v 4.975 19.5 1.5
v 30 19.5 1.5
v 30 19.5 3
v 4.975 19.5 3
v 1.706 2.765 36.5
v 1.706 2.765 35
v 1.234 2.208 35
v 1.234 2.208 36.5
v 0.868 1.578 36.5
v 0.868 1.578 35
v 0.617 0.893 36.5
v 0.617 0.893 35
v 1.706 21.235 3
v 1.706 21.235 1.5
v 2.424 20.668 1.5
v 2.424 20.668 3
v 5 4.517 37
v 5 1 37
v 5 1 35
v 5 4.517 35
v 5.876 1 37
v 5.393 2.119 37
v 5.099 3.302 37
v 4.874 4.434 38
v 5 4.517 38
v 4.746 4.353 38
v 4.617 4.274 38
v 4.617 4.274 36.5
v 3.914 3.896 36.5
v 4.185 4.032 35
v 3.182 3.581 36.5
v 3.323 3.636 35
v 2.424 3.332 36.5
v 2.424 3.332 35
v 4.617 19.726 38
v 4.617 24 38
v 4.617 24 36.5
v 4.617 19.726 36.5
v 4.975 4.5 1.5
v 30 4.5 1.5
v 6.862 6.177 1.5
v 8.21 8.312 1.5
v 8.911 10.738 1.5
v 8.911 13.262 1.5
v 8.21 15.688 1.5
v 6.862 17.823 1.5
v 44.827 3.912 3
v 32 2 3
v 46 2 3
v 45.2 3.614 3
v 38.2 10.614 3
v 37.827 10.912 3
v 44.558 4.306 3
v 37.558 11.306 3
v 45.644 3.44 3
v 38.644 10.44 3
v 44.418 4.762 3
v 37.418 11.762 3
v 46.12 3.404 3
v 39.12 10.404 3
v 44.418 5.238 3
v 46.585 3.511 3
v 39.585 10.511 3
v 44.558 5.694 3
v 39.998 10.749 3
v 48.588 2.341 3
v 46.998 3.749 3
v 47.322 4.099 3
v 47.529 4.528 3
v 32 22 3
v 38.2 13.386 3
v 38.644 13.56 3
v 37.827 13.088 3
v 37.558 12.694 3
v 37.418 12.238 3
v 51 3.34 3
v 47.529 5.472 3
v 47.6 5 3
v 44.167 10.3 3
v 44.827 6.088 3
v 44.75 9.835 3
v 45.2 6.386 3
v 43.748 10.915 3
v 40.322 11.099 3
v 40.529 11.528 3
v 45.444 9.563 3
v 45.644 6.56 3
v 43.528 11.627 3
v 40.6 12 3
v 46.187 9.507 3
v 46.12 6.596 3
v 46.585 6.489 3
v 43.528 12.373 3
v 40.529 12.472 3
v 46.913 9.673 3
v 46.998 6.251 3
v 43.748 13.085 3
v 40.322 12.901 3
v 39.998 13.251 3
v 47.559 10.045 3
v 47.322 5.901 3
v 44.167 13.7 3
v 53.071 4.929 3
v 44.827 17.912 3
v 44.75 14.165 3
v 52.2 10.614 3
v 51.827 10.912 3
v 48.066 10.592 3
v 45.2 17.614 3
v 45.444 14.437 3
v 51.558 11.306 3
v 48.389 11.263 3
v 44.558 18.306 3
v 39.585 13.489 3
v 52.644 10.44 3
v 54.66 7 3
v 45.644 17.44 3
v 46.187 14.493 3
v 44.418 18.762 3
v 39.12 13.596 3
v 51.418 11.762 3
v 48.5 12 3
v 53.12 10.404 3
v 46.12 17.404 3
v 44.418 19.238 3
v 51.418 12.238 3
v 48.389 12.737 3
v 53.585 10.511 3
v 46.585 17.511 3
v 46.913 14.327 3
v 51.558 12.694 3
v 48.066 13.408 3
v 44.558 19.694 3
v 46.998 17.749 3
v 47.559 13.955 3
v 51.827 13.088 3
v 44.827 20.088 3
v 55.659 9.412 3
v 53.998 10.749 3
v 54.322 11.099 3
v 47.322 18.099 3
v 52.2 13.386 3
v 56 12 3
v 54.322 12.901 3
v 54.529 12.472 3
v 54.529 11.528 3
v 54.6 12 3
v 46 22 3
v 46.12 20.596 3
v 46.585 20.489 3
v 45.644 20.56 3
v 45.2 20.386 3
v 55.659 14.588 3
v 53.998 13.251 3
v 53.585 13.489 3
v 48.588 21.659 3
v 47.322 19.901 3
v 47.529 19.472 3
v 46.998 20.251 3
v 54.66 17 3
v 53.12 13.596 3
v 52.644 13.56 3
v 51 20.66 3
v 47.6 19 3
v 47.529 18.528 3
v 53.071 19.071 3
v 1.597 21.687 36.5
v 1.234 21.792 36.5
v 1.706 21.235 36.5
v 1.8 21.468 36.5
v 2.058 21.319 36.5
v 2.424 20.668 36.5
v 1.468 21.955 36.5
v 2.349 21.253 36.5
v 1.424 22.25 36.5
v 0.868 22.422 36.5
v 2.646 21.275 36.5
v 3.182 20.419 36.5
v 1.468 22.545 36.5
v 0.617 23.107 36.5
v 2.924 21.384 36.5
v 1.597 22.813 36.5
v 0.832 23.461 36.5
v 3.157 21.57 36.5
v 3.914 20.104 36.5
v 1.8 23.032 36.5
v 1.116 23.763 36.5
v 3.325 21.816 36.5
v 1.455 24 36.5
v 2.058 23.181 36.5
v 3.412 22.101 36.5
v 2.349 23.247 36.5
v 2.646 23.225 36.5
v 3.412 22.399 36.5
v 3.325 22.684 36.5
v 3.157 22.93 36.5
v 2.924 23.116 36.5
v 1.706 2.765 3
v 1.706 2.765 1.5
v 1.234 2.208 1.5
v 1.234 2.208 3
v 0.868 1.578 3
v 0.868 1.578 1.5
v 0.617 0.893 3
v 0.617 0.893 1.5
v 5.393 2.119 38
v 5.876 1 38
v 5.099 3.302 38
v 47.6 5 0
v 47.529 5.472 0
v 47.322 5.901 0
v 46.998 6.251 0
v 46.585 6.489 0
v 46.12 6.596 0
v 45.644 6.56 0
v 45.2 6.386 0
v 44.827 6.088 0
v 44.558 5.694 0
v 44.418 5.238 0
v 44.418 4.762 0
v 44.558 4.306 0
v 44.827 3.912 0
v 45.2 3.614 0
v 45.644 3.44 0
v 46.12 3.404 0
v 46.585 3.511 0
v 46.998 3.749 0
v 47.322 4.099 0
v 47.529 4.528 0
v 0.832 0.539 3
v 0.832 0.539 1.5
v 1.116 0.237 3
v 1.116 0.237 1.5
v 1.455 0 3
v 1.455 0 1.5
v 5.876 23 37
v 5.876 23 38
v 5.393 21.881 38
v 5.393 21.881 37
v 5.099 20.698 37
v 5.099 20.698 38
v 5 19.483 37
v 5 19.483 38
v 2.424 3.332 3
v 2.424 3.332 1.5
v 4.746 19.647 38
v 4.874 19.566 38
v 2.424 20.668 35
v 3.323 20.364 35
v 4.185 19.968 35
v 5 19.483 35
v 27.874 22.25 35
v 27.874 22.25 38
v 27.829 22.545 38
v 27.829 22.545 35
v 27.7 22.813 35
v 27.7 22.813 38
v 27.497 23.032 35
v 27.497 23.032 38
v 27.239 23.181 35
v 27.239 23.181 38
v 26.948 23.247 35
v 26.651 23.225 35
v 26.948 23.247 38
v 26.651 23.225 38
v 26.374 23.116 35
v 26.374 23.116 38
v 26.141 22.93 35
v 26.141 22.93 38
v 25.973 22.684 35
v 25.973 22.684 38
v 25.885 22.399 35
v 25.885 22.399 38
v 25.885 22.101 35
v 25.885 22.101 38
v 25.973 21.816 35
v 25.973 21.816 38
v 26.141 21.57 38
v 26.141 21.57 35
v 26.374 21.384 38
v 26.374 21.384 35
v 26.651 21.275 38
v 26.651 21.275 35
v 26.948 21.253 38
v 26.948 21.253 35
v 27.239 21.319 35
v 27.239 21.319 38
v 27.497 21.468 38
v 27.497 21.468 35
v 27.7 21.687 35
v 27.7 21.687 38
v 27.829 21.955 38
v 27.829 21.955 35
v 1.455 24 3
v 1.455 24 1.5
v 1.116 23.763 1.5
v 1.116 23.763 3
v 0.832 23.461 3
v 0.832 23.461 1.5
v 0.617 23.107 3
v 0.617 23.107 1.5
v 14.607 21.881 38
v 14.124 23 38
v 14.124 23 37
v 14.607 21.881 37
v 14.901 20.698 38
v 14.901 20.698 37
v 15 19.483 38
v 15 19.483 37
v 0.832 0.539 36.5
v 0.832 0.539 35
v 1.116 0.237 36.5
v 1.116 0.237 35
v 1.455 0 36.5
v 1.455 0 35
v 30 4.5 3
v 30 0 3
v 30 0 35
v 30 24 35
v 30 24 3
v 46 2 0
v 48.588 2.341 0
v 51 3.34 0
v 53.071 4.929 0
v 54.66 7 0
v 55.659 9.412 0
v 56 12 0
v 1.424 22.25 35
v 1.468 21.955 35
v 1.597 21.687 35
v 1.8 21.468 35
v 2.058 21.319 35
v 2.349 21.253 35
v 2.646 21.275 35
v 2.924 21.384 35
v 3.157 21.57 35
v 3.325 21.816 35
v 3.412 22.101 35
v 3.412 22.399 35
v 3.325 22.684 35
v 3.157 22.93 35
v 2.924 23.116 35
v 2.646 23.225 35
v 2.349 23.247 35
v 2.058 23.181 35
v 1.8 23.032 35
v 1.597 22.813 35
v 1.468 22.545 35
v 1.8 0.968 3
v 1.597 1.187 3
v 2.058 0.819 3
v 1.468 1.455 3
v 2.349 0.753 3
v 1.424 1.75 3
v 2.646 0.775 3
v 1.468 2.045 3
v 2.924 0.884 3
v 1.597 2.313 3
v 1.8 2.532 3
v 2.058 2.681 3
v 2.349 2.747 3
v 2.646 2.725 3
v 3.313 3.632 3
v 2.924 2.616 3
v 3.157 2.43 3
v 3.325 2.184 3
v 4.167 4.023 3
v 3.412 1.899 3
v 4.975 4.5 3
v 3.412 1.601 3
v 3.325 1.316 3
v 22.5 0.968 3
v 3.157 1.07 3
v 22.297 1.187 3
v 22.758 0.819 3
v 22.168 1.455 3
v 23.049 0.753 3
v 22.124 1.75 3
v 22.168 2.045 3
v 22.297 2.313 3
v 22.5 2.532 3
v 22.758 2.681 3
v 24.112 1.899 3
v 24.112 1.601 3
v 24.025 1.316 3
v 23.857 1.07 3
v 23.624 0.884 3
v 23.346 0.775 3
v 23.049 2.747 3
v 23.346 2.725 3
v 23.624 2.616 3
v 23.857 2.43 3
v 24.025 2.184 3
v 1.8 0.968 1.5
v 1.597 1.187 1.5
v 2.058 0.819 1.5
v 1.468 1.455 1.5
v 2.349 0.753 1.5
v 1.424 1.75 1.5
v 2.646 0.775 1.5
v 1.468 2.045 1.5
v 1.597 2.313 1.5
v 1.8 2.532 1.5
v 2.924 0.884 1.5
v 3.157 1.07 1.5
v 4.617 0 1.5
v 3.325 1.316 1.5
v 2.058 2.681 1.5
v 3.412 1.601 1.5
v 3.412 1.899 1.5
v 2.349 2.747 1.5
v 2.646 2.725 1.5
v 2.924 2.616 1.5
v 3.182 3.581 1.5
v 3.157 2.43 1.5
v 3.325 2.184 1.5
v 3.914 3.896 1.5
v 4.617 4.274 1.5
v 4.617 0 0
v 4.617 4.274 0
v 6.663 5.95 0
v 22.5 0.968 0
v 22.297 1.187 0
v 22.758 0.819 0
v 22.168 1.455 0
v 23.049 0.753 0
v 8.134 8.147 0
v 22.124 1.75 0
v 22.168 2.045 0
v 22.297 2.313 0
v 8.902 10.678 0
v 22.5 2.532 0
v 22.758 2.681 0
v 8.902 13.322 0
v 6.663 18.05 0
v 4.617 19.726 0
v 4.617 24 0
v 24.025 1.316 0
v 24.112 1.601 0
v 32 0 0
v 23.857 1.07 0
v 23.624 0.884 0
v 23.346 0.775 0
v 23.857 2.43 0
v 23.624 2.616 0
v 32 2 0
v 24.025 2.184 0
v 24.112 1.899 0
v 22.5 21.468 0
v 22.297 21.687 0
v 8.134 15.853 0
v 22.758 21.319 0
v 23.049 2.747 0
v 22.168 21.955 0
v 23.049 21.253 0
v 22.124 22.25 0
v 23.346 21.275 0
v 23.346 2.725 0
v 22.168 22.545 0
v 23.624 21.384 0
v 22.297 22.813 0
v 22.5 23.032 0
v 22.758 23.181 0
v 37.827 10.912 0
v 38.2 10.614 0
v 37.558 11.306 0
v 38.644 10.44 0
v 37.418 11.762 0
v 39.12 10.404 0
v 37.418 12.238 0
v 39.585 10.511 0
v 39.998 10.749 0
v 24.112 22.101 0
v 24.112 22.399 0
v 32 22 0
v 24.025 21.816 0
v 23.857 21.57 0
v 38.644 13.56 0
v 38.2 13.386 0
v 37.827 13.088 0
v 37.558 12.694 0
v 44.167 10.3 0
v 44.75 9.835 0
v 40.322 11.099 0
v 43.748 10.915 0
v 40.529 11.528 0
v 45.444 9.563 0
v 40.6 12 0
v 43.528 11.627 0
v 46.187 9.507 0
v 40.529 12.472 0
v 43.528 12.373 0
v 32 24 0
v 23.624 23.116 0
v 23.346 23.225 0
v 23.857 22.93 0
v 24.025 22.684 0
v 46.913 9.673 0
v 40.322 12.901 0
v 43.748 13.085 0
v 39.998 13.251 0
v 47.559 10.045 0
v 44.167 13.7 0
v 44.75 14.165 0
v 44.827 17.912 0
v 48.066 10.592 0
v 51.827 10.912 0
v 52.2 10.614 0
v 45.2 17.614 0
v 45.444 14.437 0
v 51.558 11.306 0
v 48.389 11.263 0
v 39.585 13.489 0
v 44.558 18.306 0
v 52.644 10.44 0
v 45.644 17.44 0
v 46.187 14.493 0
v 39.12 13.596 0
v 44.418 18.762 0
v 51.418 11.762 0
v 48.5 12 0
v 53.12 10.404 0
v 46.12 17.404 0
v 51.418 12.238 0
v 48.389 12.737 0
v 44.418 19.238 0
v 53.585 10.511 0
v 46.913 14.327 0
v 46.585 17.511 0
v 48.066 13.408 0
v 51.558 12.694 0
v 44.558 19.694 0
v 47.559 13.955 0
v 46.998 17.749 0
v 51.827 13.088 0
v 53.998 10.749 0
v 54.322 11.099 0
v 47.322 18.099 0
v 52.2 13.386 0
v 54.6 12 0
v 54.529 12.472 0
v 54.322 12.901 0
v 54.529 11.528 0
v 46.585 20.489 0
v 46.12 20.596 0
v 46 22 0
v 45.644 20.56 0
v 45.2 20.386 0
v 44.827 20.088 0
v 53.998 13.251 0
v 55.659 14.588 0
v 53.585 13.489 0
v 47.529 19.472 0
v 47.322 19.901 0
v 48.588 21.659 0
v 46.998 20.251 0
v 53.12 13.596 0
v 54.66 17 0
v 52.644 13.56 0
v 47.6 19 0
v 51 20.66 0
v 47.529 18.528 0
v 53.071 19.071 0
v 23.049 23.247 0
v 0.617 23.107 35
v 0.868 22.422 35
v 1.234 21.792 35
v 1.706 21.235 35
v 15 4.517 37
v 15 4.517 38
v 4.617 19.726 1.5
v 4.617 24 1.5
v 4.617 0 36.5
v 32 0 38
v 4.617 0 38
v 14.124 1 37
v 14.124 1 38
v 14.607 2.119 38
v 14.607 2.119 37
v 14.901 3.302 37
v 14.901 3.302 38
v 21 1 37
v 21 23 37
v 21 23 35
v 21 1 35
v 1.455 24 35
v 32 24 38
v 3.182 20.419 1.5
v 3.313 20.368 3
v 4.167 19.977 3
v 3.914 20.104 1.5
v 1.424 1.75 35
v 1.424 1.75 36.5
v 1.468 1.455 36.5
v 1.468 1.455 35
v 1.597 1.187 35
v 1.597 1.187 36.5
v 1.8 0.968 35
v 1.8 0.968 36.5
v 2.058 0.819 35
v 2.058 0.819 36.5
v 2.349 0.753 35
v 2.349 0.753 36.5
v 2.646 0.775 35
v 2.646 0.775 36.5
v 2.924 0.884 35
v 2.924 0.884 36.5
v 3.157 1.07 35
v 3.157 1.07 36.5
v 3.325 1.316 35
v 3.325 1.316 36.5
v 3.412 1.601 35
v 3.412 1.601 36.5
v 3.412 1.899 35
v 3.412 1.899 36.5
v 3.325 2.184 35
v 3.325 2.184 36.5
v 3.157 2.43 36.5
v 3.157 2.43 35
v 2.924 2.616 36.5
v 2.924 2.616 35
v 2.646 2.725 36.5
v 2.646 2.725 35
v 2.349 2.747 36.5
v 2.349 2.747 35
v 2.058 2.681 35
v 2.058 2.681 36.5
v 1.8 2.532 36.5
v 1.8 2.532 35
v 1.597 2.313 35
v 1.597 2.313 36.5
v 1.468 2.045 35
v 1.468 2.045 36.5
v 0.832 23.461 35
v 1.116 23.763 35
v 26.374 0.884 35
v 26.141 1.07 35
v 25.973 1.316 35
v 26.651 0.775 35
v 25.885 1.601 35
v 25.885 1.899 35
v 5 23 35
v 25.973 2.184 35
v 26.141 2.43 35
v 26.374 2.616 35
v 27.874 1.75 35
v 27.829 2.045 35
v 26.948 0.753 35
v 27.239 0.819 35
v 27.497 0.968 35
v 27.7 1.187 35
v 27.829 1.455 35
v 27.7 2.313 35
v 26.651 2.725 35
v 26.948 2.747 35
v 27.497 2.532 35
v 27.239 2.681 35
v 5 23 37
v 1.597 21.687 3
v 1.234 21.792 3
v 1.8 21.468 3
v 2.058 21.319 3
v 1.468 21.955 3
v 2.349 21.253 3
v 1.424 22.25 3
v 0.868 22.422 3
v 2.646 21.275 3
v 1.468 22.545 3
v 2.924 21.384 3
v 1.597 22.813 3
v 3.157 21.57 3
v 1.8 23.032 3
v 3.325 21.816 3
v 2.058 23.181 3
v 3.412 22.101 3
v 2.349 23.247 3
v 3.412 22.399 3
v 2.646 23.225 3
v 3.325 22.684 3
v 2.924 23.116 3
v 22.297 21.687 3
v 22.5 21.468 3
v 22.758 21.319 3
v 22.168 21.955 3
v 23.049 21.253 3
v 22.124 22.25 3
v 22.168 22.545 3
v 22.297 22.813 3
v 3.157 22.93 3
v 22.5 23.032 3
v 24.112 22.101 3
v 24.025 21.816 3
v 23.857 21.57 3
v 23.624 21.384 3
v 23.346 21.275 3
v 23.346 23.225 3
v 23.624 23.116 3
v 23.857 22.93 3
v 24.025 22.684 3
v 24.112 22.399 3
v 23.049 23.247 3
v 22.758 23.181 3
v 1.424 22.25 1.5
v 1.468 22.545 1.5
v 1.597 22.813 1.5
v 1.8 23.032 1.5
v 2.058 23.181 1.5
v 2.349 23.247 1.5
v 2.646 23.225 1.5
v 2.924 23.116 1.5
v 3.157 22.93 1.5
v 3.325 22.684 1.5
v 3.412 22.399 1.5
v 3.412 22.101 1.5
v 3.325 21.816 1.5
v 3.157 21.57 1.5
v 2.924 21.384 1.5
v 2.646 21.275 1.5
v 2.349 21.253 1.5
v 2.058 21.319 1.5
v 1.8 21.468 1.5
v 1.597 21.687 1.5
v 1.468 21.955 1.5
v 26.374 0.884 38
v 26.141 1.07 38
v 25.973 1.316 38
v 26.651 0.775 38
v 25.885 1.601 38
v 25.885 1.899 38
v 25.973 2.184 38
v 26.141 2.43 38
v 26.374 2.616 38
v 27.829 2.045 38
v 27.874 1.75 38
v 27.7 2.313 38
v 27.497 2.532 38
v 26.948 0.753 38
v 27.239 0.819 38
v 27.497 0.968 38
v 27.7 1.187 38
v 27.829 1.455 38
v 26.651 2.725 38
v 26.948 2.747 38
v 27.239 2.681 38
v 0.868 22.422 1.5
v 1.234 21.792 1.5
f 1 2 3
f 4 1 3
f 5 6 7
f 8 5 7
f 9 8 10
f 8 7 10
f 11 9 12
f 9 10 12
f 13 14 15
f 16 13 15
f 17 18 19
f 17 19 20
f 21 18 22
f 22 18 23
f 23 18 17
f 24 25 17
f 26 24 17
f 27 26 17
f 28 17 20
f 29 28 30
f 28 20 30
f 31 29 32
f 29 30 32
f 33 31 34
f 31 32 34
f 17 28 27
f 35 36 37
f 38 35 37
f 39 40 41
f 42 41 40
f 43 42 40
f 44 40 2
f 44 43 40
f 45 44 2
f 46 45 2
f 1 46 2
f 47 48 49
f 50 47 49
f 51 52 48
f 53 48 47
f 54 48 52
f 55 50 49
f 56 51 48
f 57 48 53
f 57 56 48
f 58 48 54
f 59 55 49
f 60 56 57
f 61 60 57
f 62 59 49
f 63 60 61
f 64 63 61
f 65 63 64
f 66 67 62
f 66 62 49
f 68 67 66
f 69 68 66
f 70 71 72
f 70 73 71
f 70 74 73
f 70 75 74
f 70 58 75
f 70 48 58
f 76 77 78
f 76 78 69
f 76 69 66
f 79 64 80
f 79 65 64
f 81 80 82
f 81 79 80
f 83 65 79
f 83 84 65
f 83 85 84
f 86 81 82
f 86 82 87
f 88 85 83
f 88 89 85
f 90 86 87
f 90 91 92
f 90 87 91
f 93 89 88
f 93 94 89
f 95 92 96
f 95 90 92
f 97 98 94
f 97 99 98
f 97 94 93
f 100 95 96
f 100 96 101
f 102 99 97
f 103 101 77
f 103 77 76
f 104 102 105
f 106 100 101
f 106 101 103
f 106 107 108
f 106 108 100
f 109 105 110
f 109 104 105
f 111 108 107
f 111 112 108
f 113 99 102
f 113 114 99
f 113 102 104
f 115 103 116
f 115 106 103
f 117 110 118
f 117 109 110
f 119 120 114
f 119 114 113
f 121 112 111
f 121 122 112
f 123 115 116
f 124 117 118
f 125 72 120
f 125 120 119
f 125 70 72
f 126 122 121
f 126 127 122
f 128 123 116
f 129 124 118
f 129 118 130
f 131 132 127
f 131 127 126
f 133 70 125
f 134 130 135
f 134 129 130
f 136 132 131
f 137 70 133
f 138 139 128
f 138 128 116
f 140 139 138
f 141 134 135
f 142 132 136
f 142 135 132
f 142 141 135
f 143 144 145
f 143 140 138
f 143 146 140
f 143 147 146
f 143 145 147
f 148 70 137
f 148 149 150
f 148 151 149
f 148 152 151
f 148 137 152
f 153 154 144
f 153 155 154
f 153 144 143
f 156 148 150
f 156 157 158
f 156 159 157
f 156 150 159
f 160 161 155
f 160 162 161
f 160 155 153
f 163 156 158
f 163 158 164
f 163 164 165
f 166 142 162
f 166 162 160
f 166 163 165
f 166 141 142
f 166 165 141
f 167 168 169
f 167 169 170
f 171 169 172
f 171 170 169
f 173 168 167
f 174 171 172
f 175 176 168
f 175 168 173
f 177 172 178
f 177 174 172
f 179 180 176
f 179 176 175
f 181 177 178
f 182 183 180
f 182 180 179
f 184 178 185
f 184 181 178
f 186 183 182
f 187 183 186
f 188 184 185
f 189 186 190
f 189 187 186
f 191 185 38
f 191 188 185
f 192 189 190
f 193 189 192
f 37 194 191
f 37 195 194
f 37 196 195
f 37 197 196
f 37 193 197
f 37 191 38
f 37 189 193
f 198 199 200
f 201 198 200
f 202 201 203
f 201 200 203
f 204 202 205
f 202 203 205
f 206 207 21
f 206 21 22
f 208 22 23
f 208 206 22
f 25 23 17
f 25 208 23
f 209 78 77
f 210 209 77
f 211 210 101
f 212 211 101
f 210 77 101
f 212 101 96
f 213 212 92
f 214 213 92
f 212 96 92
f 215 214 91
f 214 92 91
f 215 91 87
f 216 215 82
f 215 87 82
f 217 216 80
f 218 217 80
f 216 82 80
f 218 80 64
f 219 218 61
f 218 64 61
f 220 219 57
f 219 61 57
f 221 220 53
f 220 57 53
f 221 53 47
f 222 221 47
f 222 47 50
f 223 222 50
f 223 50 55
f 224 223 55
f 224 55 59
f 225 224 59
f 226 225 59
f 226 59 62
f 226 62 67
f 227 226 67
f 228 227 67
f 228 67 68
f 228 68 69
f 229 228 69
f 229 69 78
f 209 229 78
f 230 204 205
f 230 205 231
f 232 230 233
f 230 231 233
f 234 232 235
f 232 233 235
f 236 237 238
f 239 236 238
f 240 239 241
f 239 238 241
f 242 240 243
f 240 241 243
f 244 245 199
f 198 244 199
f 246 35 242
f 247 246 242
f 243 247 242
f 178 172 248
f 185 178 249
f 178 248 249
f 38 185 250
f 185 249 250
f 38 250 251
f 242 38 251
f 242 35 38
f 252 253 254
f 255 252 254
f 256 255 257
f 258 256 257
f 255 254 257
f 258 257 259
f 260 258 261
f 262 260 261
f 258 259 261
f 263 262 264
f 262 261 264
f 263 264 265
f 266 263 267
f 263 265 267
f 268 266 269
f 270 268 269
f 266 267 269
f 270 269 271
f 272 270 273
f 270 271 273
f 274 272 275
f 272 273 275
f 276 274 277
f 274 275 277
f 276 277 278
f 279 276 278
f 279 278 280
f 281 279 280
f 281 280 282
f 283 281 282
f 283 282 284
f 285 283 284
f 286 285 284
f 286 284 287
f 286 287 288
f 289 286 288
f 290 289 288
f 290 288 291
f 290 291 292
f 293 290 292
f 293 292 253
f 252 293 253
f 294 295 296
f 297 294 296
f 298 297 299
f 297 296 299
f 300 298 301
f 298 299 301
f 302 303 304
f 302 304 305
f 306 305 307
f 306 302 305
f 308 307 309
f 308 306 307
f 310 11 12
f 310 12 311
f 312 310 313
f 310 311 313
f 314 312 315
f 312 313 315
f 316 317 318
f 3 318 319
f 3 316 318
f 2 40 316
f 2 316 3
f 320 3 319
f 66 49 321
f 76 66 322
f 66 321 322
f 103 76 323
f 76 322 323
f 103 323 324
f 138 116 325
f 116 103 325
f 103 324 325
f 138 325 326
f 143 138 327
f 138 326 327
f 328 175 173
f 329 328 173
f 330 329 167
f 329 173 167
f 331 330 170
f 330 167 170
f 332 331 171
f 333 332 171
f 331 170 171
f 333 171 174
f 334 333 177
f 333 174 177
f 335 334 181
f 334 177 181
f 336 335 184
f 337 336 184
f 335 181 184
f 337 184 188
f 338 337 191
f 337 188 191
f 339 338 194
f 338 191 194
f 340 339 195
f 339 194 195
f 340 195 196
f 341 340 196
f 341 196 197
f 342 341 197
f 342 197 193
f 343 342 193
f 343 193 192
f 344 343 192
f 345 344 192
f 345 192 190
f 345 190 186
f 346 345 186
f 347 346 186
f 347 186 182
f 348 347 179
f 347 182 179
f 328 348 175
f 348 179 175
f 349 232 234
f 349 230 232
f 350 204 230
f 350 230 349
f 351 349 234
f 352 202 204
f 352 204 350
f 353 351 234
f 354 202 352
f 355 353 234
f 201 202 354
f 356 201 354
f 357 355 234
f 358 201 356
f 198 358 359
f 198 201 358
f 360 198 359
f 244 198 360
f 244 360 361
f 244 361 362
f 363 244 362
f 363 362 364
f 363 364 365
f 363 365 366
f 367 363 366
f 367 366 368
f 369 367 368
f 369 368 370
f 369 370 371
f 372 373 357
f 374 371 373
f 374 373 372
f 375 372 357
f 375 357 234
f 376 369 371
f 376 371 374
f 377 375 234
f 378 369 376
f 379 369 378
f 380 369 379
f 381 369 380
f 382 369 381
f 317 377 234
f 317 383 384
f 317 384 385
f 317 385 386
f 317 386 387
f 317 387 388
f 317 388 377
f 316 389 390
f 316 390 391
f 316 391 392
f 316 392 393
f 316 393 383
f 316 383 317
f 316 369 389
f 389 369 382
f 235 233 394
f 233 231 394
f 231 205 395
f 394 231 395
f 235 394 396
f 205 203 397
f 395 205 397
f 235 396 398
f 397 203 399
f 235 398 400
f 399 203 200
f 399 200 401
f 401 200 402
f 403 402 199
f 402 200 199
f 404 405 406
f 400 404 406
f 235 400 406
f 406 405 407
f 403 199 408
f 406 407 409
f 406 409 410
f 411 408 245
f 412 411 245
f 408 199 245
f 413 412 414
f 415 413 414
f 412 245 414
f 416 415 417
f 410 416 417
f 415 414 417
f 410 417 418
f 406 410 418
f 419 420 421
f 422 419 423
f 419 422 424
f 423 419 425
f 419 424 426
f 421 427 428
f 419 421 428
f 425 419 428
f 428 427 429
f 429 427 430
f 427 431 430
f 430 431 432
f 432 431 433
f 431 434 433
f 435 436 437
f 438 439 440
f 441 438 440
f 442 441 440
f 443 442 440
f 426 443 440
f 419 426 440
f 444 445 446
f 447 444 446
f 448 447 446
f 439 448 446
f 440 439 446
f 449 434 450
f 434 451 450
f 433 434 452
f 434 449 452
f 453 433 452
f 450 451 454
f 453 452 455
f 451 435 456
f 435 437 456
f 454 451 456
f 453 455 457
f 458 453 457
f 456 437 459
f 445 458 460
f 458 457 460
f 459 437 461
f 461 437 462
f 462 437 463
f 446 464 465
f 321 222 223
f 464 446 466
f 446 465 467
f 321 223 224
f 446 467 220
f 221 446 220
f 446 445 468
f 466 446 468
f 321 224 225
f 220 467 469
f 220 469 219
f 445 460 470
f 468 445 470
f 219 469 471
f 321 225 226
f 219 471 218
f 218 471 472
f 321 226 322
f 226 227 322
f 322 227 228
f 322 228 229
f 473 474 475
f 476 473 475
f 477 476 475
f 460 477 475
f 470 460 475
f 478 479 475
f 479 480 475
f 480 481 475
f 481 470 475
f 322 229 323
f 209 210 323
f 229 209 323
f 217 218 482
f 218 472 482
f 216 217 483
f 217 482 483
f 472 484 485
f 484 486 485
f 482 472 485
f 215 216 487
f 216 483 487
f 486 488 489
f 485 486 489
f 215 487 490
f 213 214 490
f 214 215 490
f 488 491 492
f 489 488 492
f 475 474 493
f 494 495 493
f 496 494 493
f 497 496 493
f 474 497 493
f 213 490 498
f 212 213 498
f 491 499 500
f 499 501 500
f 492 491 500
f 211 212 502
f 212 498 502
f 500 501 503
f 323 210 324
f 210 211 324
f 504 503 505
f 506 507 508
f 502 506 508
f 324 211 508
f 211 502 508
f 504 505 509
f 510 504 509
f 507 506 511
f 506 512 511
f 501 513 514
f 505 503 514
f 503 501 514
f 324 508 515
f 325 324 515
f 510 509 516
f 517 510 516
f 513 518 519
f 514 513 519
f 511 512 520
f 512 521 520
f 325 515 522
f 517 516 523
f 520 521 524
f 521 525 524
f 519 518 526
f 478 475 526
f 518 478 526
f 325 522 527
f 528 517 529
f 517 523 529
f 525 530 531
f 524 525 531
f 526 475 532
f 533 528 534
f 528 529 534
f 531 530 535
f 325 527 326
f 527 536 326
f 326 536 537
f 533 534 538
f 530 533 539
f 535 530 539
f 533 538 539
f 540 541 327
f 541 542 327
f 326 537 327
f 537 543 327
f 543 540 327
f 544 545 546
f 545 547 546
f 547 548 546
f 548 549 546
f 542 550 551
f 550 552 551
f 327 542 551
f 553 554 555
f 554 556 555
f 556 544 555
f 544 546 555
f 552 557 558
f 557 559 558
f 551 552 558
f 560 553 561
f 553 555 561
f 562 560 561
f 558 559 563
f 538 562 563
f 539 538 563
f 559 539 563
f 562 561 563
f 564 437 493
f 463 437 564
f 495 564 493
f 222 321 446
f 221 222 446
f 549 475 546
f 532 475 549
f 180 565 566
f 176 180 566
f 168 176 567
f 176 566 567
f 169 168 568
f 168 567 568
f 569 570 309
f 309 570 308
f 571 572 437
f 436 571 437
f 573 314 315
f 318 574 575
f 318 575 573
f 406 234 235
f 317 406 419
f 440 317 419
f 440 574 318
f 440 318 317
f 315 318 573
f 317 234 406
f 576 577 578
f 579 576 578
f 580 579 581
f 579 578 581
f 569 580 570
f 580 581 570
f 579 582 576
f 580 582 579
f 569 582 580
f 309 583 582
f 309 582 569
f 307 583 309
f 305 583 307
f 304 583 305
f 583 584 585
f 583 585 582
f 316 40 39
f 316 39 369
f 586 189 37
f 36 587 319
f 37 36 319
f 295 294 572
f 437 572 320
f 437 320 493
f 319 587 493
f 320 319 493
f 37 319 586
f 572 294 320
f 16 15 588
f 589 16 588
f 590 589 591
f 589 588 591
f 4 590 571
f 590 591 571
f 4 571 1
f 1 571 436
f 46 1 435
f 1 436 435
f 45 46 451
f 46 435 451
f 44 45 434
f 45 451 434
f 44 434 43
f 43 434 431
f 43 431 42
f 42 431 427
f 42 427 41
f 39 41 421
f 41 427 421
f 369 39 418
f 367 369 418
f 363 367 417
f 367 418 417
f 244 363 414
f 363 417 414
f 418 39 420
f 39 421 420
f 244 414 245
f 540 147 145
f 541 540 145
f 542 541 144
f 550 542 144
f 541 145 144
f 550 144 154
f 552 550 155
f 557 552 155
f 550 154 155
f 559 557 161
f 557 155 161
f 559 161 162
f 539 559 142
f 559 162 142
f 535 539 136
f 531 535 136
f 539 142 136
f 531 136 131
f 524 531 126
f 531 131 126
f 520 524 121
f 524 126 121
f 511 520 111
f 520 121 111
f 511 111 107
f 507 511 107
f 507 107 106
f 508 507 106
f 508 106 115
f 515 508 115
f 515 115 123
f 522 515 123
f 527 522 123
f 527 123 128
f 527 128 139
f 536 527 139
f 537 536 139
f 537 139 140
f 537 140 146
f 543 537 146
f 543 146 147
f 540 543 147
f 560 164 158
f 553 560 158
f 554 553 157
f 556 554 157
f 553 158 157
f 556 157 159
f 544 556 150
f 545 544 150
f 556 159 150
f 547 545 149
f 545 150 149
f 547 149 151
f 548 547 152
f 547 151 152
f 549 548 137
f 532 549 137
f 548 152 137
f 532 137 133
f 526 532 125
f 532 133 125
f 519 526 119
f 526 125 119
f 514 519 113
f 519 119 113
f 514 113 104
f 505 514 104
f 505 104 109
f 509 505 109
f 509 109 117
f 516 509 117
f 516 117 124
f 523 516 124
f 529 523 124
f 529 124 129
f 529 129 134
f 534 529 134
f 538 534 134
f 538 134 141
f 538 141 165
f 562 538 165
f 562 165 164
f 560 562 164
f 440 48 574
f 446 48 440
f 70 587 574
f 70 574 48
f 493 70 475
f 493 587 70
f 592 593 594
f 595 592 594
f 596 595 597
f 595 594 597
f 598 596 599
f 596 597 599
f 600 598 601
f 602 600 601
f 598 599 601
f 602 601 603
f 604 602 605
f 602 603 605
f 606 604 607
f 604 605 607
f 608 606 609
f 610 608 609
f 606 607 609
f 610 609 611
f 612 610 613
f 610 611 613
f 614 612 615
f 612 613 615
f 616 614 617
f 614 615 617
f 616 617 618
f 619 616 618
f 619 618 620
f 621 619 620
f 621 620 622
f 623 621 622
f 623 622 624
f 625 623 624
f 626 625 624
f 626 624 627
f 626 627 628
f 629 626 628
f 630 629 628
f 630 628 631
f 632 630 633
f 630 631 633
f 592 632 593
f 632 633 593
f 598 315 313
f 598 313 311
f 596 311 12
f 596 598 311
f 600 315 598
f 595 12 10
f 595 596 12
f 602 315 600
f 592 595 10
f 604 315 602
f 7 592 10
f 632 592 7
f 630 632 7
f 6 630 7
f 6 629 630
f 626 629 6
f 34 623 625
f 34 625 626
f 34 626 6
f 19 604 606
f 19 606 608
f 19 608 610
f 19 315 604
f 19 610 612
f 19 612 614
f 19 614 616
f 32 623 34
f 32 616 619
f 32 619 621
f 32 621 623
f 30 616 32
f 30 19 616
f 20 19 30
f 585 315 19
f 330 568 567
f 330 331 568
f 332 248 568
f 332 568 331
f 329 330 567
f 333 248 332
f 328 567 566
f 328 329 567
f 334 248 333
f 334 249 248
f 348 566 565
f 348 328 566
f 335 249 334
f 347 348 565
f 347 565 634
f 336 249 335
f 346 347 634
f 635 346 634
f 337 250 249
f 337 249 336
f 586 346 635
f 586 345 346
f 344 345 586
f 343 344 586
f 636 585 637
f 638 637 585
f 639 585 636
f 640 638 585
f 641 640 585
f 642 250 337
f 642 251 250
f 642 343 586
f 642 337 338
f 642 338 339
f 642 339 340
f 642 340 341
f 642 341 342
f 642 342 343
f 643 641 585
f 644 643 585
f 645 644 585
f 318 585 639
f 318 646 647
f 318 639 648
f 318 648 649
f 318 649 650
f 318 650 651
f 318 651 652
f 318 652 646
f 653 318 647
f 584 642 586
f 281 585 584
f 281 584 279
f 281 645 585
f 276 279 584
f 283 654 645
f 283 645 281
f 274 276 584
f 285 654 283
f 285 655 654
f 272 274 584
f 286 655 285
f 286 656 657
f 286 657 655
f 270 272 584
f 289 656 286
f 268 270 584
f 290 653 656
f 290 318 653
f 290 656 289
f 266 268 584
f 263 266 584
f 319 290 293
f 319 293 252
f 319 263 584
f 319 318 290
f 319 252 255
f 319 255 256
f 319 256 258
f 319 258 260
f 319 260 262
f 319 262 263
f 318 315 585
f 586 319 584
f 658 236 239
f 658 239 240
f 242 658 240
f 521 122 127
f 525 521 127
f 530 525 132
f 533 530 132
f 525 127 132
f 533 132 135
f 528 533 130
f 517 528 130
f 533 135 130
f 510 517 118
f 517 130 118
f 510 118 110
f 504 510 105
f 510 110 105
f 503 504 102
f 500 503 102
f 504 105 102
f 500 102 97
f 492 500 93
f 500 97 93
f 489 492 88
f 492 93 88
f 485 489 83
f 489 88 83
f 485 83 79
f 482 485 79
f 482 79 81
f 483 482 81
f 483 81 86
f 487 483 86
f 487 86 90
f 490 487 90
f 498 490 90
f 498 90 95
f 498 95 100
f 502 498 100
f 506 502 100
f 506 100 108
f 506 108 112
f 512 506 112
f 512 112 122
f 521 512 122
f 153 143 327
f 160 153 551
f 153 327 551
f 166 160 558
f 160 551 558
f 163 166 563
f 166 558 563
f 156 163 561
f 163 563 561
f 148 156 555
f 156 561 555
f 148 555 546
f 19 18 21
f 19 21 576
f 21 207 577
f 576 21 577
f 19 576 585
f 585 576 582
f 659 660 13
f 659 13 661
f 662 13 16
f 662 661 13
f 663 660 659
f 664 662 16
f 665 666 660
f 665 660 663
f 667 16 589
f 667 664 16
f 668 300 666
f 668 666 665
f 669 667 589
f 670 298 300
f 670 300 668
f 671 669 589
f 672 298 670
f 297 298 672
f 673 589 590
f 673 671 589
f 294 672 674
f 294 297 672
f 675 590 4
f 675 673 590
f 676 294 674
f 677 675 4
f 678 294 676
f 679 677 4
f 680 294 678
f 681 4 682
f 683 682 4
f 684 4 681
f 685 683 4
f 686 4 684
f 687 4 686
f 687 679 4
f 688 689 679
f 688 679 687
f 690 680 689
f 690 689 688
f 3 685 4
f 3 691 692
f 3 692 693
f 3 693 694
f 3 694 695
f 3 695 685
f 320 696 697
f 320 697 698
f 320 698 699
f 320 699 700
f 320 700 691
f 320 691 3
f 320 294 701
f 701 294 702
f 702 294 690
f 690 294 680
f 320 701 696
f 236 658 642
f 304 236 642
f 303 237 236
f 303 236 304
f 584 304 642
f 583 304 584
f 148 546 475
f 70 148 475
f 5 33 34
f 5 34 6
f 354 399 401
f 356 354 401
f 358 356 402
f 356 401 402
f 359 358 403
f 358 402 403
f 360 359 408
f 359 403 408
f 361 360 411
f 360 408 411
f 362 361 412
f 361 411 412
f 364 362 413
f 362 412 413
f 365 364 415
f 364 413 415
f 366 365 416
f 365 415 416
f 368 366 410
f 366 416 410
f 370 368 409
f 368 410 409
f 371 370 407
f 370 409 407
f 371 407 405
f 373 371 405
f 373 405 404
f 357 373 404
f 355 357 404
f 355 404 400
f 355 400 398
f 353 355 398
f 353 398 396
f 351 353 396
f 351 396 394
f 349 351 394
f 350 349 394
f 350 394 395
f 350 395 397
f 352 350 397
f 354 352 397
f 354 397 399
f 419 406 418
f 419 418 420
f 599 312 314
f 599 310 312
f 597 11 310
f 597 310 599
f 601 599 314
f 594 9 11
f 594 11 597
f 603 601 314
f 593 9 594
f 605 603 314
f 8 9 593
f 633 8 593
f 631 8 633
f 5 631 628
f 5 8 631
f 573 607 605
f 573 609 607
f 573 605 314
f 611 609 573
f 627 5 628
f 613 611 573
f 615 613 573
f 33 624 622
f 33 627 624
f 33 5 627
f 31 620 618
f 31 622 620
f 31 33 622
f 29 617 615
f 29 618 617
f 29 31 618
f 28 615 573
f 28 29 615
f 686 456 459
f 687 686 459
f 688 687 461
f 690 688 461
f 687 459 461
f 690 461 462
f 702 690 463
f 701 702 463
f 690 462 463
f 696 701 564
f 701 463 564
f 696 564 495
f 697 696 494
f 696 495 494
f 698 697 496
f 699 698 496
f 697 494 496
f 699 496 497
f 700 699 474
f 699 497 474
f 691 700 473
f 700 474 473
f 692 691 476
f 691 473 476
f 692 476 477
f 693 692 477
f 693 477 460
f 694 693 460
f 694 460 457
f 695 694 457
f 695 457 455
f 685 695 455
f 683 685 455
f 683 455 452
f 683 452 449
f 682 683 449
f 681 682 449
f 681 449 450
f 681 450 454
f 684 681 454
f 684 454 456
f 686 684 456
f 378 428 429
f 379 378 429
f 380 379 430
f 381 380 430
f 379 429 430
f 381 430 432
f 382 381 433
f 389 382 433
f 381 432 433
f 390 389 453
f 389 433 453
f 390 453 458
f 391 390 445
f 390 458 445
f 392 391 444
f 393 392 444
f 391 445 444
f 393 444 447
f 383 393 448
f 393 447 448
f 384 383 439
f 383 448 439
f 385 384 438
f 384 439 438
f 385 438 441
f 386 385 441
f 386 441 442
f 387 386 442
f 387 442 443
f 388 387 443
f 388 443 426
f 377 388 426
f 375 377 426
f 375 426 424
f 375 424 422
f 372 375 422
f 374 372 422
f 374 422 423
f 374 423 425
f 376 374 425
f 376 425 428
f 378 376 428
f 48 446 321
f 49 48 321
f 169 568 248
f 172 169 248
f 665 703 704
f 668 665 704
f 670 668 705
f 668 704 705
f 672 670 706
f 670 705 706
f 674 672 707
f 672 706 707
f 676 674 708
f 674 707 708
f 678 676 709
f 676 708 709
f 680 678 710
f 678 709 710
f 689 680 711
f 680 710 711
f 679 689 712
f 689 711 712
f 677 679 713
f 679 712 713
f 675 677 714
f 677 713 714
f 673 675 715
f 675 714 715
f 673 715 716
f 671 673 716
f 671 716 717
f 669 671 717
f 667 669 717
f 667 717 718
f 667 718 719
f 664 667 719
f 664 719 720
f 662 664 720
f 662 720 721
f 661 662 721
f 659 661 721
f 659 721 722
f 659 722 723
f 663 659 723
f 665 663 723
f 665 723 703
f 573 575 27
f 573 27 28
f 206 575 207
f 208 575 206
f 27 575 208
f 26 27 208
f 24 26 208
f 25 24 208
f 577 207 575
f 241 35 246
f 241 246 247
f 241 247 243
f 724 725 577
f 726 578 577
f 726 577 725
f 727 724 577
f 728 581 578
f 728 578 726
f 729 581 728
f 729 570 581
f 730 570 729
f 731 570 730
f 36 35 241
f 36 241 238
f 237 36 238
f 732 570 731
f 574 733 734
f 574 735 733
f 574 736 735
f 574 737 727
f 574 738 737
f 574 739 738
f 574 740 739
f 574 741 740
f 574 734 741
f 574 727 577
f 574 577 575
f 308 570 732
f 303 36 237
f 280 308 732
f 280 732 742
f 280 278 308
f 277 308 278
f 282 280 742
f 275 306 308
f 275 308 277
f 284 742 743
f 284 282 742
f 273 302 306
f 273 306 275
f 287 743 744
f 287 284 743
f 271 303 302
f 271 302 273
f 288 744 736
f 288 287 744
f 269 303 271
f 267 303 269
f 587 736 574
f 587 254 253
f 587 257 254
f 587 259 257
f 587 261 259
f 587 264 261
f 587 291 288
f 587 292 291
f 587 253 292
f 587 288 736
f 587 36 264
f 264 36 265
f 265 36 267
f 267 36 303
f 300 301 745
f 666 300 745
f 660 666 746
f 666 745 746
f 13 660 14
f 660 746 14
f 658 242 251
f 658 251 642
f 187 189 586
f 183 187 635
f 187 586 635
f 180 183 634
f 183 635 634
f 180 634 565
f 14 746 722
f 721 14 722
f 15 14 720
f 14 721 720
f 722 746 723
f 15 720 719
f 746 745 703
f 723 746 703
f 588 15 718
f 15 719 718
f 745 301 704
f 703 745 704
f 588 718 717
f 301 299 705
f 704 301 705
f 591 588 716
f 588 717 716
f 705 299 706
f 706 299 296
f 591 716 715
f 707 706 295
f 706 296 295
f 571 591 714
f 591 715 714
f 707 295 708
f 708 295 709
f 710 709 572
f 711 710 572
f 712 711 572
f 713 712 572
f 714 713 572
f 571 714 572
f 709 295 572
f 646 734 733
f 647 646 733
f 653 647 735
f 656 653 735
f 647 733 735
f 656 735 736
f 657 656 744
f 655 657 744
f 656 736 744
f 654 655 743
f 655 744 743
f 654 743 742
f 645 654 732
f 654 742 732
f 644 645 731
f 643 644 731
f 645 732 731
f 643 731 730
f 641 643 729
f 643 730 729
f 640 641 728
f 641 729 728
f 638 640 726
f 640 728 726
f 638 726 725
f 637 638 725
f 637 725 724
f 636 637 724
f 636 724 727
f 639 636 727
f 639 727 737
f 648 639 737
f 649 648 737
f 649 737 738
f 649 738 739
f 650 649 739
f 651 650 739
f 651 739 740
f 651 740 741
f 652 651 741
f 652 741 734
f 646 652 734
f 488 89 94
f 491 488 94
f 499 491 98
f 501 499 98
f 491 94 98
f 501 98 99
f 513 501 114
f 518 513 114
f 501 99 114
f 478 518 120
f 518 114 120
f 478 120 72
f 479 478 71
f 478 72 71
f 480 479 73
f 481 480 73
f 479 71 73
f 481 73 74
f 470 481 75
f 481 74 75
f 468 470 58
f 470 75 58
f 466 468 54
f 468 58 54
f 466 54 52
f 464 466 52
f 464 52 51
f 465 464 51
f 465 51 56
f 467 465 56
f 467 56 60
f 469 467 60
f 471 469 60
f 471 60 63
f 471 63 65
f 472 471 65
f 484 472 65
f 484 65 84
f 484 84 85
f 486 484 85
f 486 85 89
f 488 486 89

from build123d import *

# Parameters (mm, degrees)
SKETCH_1_W           = 58
SKETCH_1_H           = 24
EXTRUDE_1_DEPTH      = 3
SKETCH_2_W           = 2
SKETCH_2_H           = 24
EXTRUDE_2_DEPTH      = 32
SKETCH_3_W           = 3
SKETCH_3_H           = 24
EXTRUDE_3_DEPTH      = 32
SKETCH_4_R           = 9
CUT_EXTRUDE_1_DEPTH  = 74.375745311
CUT_EXTRUDE_2_REACH  = 75.376
SKETCH_5_R           = 1
CUT_EXTRUDE_3_REACH  = 75.376
SKETCH_6_W           = 10
SKETCH_6_H           = 22
SKETCH_7_W           = 2
SKETCH_7_H           = 22
CUT_EXTRUDE_4_DEPTH  = 6
CUT_EXTRUDE_5_REACH  = 75.376
SKETCH_8_R           = 1
EXTRUDE_4_DEPTH      = 1
CUT_EXTRUDE_6_DEPTH  = 74.375745311
CUT_EXTRUDE_7_DEPTH  = 74.375745311
CUT_EXTRUDE_8_DEPTH  = 74.375745311
SKETCH_15_W          = 10.429412993
SKETCH_15_H          = 1.5
CUT_EXTRUDE_9_DEPTH  = 74.375745311
SKETCH_16_W          = 1.5
SKETCH_16_H          = 15
CUT_EXTRUDE_10_DEPTH = 27.576338772
CUT_EXTRUDE_11_REACH = 73.868
SKETCH_17_R          = 1.6
SKETCH_17_R_2        = 2.5
CUT_EXTRUDE_12_REACH = 75.376


with BuildPart() as part:
    # 草图1 → 凸台-拉伸1 (new body)
    with BuildSketch(Plane.XY):
        with Locations((29, 12)):
            Rectangle(SKETCH_1_W, SKETCH_1_H)
    extrude(amount=EXTRUDE_1_DEPTH)

    # 草图2 → 凸台-拉伸2 (add)
    with BuildSketch(Plane.XY.offset(3)):
        with Locations((31, 12)):
            Rectangle(SKETCH_2_W, SKETCH_2_H)
    extrude(amount=EXTRUDE_2_DEPTH)

    # 草图3 → 凸台-拉伸3 (add)
    with BuildSketch(Plane(origin=(32, 0, 0), x_dir=(0, 0, -1), z_dir=(1, 0, 0))):
        with Locations((-36.5, 12)):
            Rectangle(SKETCH_3_W, SKETCH_3_H)
    extrude(amount=-EXTRUDE_3_DEPTH)

    # 草图4 → 切除-拉伸1 (cut, through all)
    with BuildSketch(Plane(origin=(0, 0, 0), x_dir=(-1, 0, 0), z_dir=(0, 0, -1))):
        with Locations((0, 12)):
            Circle(SKETCH_4_R)
    extrude(amount=-CUT_EXTRUDE_1_DEPTH, mode=Mode.SUBTRACT)

    # 草图5 → 切除-拉伸2 (cut, up to next)
    with BuildSketch(Plane(origin=(0, 0, 0), x_dir=(-1, 0, 0), z_dir=(0, 0, -1)), mode=Mode.PRIVATE) as cut_extrude_2_sk1:
        with Locations((-2.423661228, 22.25)):
            Circle(SKETCH_5_R)
    cut_extrude_2_tool1 = extrude(cut_extrude_2_sk1.sketch, amount=-CUT_EXTRUDE_2_REACH, mode=Mode.PRIVATE) & part.part
    # 草图5 → 切除-拉伸2 (cut, up to next)
    with BuildSketch(Plane(origin=(0, 0, 0), x_dir=(-1, 0, 0), z_dir=(0, 0, -1)), mode=Mode.PRIVATE) as cut_extrude_2_sk2:
        with Locations((-2.423661228, 1.75)):
            Circle(SKETCH_5_R)
    cut_extrude_2_tool2 = extrude(cut_extrude_2_sk2.sketch, amount=-CUT_EXTRUDE_2_REACH, mode=Mode.PRIVATE) & part.part
    # 草图5 → 切除-拉伸2 (cut, up to next)
    with BuildSketch(Plane(origin=(0, 0, 0), x_dir=(-1, 0, 0), z_dir=(0, 0, -1)), mode=Mode.PRIVATE) as cut_extrude_2_sk3:
        with Locations((-23.123661228, 1.75)):
            Circle(SKETCH_5_R)
    cut_extrude_2_tool3 = extrude(cut_extrude_2_sk3.sketch, amount=-CUT_EXTRUDE_2_REACH, mode=Mode.PRIVATE) & part.part
    # 草图5 → 切除-拉伸2 (cut, up to next)
    with BuildSketch(Plane(origin=(0, 0, 0), x_dir=(-1, 0, 0), z_dir=(0, 0, -1)), mode=Mode.PRIVATE) as cut_extrude_2_sk4:
        with Locations((-23.123661228, 22.25)):
            Circle(SKETCH_5_R)
    cut_extrude_2_tool4 = extrude(cut_extrude_2_sk4.sketch, amount=-CUT_EXTRUDE_2_REACH, mode=Mode.PRIVATE) & part.part
    add(cut_extrude_2_tool1.solids().sort_by_distance((2.423661, 22.25, 0))[0], mode=Mode.SUBTRACT)
    add(cut_extrude_2_tool2.solids().sort_by_distance((2.423661, 1.75, 0))[0], mode=Mode.SUBTRACT)
    add(cut_extrude_2_tool3.solids().sort_by_distance((23.123661, 1.75, 0))[0], mode=Mode.SUBTRACT)
    add(cut_extrude_2_tool4.solids().sort_by_distance((23.123661, 22.25, 0))[0], mode=Mode.SUBTRACT)

    # 草图6 → 切除-拉伸3 (cut, up to next)
    with BuildSketch(Plane.XY.offset(38), mode=Mode.PRIVATE) as cut_extrude_3_sk1:
        with Locations((10, 12)):
            Rectangle(SKETCH_6_W, SKETCH_6_H)
    cut_extrude_3_tool1 = extrude(cut_extrude_3_sk1.sketch, amount=-CUT_EXTRUDE_3_REACH, mode=Mode.PRIVATE) & part.part
    add(cut_extrude_3_tool1.solids().sort_by_distance((10, 12, 38))[0], mode=Mode.SUBTRACT)

    # 草图7 → 切除-拉伸4 (cut)
    with BuildSketch(Plane.ZY.offset(-15)):
        with Locations((36, 12)):
            Rectangle(SKETCH_7_W, SKETCH_7_H)
    extrude(amount=-CUT_EXTRUDE_4_DEPTH, mode=Mode.SUBTRACT)

    # 草图8 → 切除-拉伸5 (cut, up to next)
    with BuildSketch(Plane.XY.offset(38), mode=Mode.PRIVATE) as cut_extrude_5_sk1:
        with Locations(Location((2.423661228, 22.25, 0), (0, 0, 180))):
            Circle(SKETCH_8_R)
    cut_extrude_5_tool1 = extrude(cut_extrude_5_sk1.sketch, amount=-CUT_EXTRUDE_5_REACH, mode=Mode.PRIVATE) & part.part
    # 草图8 → 切除-拉伸5 (cut, up to next)
    with BuildSketch(Plane.XY.offset(38), mode=Mode.PRIVATE) as cut_extrude_5_sk2:
        with Locations(Location((2.423661228, 1.75, 0), (0, 0, 180))):
            Circle(SKETCH_8_R)
    cut_extrude_5_tool2 = extrude(cut_extrude_5_sk2.sketch, amount=-CUT_EXTRUDE_5_REACH, mode=Mode.PRIVATE) & part.part
    # 草图8 → 切除-拉伸5 (cut, up to next)
    with BuildSketch(Plane.XY.offset(38), mode=Mode.PRIVATE) as cut_extrude_5_sk3:
        with Locations((26.873661228, 22.25)):
            Circle(SKETCH_8_R)
    cut_extrude_5_tool3 = extrude(cut_extrude_5_sk3.sketch, amount=-CUT_EXTRUDE_5_REACH, mode=Mode.PRIVATE) & part.part
    # 草图8 → 切除-拉伸5 (cut, up to next)
    with BuildSketch(Plane.XY.offset(38), mode=Mode.PRIVATE) as cut_extrude_5_sk4:
        with Locations((26.873661228, 1.75)):
            Circle(SKETCH_8_R)
    cut_extrude_5_tool4 = extrude(cut_extrude_5_sk4.sketch, amount=-CUT_EXTRUDE_5_REACH, mode=Mode.PRIVATE) & part.part
    add(cut_extrude_5_tool1.solids().sort_by_distance((2.423661, 22.25, 38))[0], mode=Mode.SUBTRACT)
    add(cut_extrude_5_tool2.solids().sort_by_distance((2.423661, 1.75, 38))[0], mode=Mode.SUBTRACT)
    add(cut_extrude_5_tool3.solids().sort_by_distance((26.873661, 22.25, 38))[0], mode=Mode.SUBTRACT)
    add(cut_extrude_5_tool4.solids().sort_by_distance((26.873661, 1.75, 38))[0], mode=Mode.SUBTRACT)

    # 草图9 → 凸台-拉伸4 (add)
    with BuildSketch(Plane.XY.offset(38)):
        with BuildLine():
            Line((5, 1), (5.875581156, 1))
            ThreePointArc((5.875581156, 1), (5.222186409, 2.704661679), (5, 4.516685226))
            Line((5, 4.516685226), (5, 1))
        make_face()
        with BuildLine():
            Line((15, 23), (14.124418844, 23))
            ThreePointArc((14.124418844, 23), (14.777813591, 21.295338321), (15, 19.483314774))
            Line((15, 19.483314774), (15, 23))
        make_face()
        with BuildLine():
            Line((15, 4.516685226), (15, 1))
            Line((15, 1), (14.124418844, 1))
            ThreePointArc((14.124418844, 1), (14.777813591, 2.704661679), (15, 4.516685226))
        make_face()
        with BuildLine():
            Line((5, 19.483314774), (5, 23))
            Line((5, 23), (5.875581156, 23))
            ThreePointArc((5.875581156, 23), (5.222186409, 21.295338321), (5, 19.483314774))
        make_face()
    extrude(amount=-EXTRUDE_4_DEPTH)

    # 草图11 → 切除-拉伸6 (cut, through all)
    with BuildSketch(Plane(origin=(0, 0, 0), x_dir=(-1, 0, 0), z_dir=(0, 0, -1))):
        with BuildLine():
            Line((0, 21), (0, 24))
            Line((0, 24), (-1.455415392, 24))
            ThreePointArc((-1.455415392, 24), (-0.456169147, 22.609130768), (-0.899591526, 20.954927978))
            ThreePointArc((-0.899591526, 20.954927978), (-0.450359967, 20.988724932), (0, 21))
        make_face()
        with BuildLine():
            Line((-1.455415392, 0), (0, 0))
            Line((0, 0), (0, 3))
            ThreePointArc((0, 3), (-0.450359967, 3.011275068), (-0.899591526, 3.045072022))
            ThreePointArc((-0.899591526, 3.045072022), (-0.456169147, 1.390869232), (-1.455415392, 0))
        make_face()
    extrude(amount=-CUT_EXTRUDE_6_DEPTH, mode=Mode.SUBTRACT)

    # 草图12 → 切除-拉伸7 (cut, through all)
    with BuildSketch(Plane(origin=(0, 0, 0), x_dir=(-1, 0, 0), z_dir=(0, 0, -1))):
        with BuildLine():
            ThreePointArc((-0.899591526, 3.045072022), (-1.667828935, 3.155886328), (-2.423661228, 3.332482117))
            Line((-2.423661228, 3.332482117), (-0.423661228, 1.75))
            ThreePointArc((-0.423661228, 1.75), (-0.546410658, 2.439877016), (-0.899591526, 3.045072022))
        make_face()
        with BuildLine():
            ThreePointArc((-0.899591526, 20.954927978), (-0.546410658, 21.560122984), (-0.423661228, 22.25))
            Line((-0.423661228, 22.25), (-2.423661228, 20.667517883))
            ThreePointArc((-2.423661228, 20.667517883), (-1.667828935, 20.844113672), (-0.899591526, 20.954927978))
        make_face()
    extrude(amount=-CUT_EXTRUDE_7_DEPTH, mode=Mode.SUBTRACT)

    # 草图13 → 切除-拉伸8 (cut, through all)
    with BuildSketch(Plane(origin=(0, 0, 0), x_dir=(-1, 0, 0), z_dir=(0, 0, -1))):
        with BuildLine():
            ThreePointArc((-0.616666185, 23.107186627), (-1.037059303, 22.099034069), (-1.705884996, 21.235451909))
            Line((-1.705884996, 21.235451909), (-0.423661228, 22.25))
            ThreePointArc((-0.423661228, 22.25), (-0.472508993, 22.689323294), (-0.616666185, 23.107186627))
        make_face()
        with BuildLine():
            ThreePointArc((-0.616666185, 0.892813373), (-0.472508993, 1.310676706), (-0.423661228, 1.75))
            Line((-0.423661228, 1.75), (-1.705884996, 2.764548091))
            ThreePointArc((-1.705884996, 2.764548091), (-1.037059303, 1.900965931), (-0.616666185, 0.892813373))
        make_face()
    extrude(amount=-CUT_EXTRUDE_8_DEPTH, mode=Mode.SUBTRACT)

    # 草图15 → 切除-拉伸9 (cut, through all)
    with BuildSketch(Plane(origin=(0, 24, 0), x_dir=(1, 0, 0), z_dir=(0, 1, 0))):
        with Locations((-0.598040311, -37.25)):
            Rectangle(SKETCH_15_W, SKETCH_15_H)
        with Locations((-0.598040311, -0.75)):
            Rectangle(SKETCH_15_W, SKETCH_15_H)
    extrude(amount=-CUT_EXTRUDE_9_DEPTH, mode=Mode.SUBTRACT)

    # 草图16 → 切除-拉伸10 (cut)
    with BuildSketch(Plane.ZY.offset(-2.423661228)):
        with Locations((2.25, 12)):
            Rectangle(SKETCH_16_W, SKETCH_16_H)
    extrude(amount=-CUT_EXTRUDE_10_DEPTH, mode=Mode.SUBTRACT)

    # 草图17 → 切除-拉伸11 (cut, up to next)
    with BuildSketch(Plane.XY.offset(3), mode=Mode.PRIVATE) as cut_extrude_11_sk1:
        with Locations((53, 12)):
            Circle(SKETCH_17_R)
    cut_extrude_11_tool1 = extrude(cut_extrude_11_sk1.sketch, amount=-CUT_EXTRUDE_11_REACH, mode=Mode.PRIVATE) & part.part
    # 草图17 → 切除-拉伸11 (cut, up to next)
    with BuildSketch(Plane.XY.offset(3), mode=Mode.PRIVATE) as cut_extrude_11_sk2:
        with Locations((46, 12)):
            Circle(SKETCH_17_R_2)
    cut_extrude_11_tool2 = extrude(cut_extrude_11_sk2.sketch, amount=-CUT_EXTRUDE_11_REACH, mode=Mode.PRIVATE) & part.part
    # 草图17 → 切除-拉伸11 (cut, up to next)
    with BuildSketch(Plane.XY.offset(3), mode=Mode.PRIVATE) as cut_extrude_11_sk3:
        with Locations((46, 19)):
            Circle(SKETCH_17_R)
    cut_extrude_11_tool3 = extrude(cut_extrude_11_sk3.sketch, amount=-CUT_EXTRUDE_11_REACH, mode=Mode.PRIVATE) & part.part
    # 草图17 → 切除-拉伸11 (cut, up to next)
    with BuildSketch(Plane.XY.offset(3), mode=Mode.PRIVATE) as cut_extrude_11_sk4:
        with Locations((46, 5)):
            Circle(SKETCH_17_R)
    cut_extrude_11_tool4 = extrude(cut_extrude_11_sk4.sketch, amount=-CUT_EXTRUDE_11_REACH, mode=Mode.PRIVATE) & part.part
    # 草图17 → 切除-拉伸11 (cut, up to next)
    with BuildSketch(Plane.XY.offset(3), mode=Mode.PRIVATE) as cut_extrude_11_sk5:
        with Locations((39, 12)):
            Circle(SKETCH_17_R)
    cut_extrude_11_tool5 = extrude(cut_extrude_11_sk5.sketch, amount=-CUT_EXTRUDE_11_REACH, mode=Mode.PRIVATE) & part.part
    add(cut_extrude_11_tool1.solids().sort_by_distance((53, 12, 3))[0], mode=Mode.SUBTRACT)
    add(cut_extrude_11_tool2.solids().sort_by_distance((46, 12, 3))[0], mode=Mode.SUBTRACT)
    add(cut_extrude_11_tool3.solids().sort_by_distance((46, 19, 3))[0], mode=Mode.SUBTRACT)
    add(cut_extrude_11_tool4.solids().sort_by_distance((46, 5, 3))[0], mode=Mode.SUBTRACT)
    add(cut_extrude_11_tool5.solids().sort_by_distance((39, 12, 3))[0], mode=Mode.SUBTRACT)

    # 草图18 → 切除-拉伸12 (cut, up to next)
    with BuildSketch(Plane(origin=(0, 0, 0), x_dir=(-1, 0, 0), z_dir=(0, 0, -1)), mode=Mode.PRIVATE) as cut_extrude_12_sk1:
        with BuildLine():
            Line((-32, 2), (-46, 2))
            ThreePointArc((-46, 2), (-53.071067812, 4.928932188), (-56, 12))
            Line((-56, 12), (-58, 12))
            Line((-58, 12), (-58, 0))
            Line((-58, 0), (-32, 0))
            Line((-32, 0), (-32, 2))
        make_face()
    cut_extrude_12_tool1 = extrude(cut_extrude_12_sk1.sketch, amount=-CUT_EXTRUDE_12_REACH, mode=Mode.PRIVATE) & part.part
    # 草图18 → 切除-拉伸12 (cut, up to next)
    with BuildSketch(Plane(origin=(0, 0, 0), x_dir=(-1, 0, 0), z_dir=(0, 0, -1)), mode=Mode.PRIVATE) as cut_extrude_12_sk2:
        with BuildLine():
            Line((-58, 12), (-56, 12))
            ThreePointArc((-56, 12), (-53.071067812, 19.071067812), (-46, 22))
            Line((-46, 22), (-32, 22))
            Line((-32, 22), (-32, 24))
            Line((-32, 24), (-58, 24))
            Line((-58, 24), (-58, 12))
        make_face()
    cut_extrude_12_tool2 = extrude(cut_extrude_12_sk2.sketch, amount=-CUT_EXTRUDE_12_REACH, mode=Mode.PRIVATE) & part.part
    add(cut_extrude_12_tool1.solids().sort_by_distance((39, 1.713644, 0))[0], mode=Mode.SUBTRACT)
    add(cut_extrude_12_tool2.solids().sort_by_distance((57.713644, 18, 0))[0], mode=Mode.SUBTRACT)


solid = part.part
